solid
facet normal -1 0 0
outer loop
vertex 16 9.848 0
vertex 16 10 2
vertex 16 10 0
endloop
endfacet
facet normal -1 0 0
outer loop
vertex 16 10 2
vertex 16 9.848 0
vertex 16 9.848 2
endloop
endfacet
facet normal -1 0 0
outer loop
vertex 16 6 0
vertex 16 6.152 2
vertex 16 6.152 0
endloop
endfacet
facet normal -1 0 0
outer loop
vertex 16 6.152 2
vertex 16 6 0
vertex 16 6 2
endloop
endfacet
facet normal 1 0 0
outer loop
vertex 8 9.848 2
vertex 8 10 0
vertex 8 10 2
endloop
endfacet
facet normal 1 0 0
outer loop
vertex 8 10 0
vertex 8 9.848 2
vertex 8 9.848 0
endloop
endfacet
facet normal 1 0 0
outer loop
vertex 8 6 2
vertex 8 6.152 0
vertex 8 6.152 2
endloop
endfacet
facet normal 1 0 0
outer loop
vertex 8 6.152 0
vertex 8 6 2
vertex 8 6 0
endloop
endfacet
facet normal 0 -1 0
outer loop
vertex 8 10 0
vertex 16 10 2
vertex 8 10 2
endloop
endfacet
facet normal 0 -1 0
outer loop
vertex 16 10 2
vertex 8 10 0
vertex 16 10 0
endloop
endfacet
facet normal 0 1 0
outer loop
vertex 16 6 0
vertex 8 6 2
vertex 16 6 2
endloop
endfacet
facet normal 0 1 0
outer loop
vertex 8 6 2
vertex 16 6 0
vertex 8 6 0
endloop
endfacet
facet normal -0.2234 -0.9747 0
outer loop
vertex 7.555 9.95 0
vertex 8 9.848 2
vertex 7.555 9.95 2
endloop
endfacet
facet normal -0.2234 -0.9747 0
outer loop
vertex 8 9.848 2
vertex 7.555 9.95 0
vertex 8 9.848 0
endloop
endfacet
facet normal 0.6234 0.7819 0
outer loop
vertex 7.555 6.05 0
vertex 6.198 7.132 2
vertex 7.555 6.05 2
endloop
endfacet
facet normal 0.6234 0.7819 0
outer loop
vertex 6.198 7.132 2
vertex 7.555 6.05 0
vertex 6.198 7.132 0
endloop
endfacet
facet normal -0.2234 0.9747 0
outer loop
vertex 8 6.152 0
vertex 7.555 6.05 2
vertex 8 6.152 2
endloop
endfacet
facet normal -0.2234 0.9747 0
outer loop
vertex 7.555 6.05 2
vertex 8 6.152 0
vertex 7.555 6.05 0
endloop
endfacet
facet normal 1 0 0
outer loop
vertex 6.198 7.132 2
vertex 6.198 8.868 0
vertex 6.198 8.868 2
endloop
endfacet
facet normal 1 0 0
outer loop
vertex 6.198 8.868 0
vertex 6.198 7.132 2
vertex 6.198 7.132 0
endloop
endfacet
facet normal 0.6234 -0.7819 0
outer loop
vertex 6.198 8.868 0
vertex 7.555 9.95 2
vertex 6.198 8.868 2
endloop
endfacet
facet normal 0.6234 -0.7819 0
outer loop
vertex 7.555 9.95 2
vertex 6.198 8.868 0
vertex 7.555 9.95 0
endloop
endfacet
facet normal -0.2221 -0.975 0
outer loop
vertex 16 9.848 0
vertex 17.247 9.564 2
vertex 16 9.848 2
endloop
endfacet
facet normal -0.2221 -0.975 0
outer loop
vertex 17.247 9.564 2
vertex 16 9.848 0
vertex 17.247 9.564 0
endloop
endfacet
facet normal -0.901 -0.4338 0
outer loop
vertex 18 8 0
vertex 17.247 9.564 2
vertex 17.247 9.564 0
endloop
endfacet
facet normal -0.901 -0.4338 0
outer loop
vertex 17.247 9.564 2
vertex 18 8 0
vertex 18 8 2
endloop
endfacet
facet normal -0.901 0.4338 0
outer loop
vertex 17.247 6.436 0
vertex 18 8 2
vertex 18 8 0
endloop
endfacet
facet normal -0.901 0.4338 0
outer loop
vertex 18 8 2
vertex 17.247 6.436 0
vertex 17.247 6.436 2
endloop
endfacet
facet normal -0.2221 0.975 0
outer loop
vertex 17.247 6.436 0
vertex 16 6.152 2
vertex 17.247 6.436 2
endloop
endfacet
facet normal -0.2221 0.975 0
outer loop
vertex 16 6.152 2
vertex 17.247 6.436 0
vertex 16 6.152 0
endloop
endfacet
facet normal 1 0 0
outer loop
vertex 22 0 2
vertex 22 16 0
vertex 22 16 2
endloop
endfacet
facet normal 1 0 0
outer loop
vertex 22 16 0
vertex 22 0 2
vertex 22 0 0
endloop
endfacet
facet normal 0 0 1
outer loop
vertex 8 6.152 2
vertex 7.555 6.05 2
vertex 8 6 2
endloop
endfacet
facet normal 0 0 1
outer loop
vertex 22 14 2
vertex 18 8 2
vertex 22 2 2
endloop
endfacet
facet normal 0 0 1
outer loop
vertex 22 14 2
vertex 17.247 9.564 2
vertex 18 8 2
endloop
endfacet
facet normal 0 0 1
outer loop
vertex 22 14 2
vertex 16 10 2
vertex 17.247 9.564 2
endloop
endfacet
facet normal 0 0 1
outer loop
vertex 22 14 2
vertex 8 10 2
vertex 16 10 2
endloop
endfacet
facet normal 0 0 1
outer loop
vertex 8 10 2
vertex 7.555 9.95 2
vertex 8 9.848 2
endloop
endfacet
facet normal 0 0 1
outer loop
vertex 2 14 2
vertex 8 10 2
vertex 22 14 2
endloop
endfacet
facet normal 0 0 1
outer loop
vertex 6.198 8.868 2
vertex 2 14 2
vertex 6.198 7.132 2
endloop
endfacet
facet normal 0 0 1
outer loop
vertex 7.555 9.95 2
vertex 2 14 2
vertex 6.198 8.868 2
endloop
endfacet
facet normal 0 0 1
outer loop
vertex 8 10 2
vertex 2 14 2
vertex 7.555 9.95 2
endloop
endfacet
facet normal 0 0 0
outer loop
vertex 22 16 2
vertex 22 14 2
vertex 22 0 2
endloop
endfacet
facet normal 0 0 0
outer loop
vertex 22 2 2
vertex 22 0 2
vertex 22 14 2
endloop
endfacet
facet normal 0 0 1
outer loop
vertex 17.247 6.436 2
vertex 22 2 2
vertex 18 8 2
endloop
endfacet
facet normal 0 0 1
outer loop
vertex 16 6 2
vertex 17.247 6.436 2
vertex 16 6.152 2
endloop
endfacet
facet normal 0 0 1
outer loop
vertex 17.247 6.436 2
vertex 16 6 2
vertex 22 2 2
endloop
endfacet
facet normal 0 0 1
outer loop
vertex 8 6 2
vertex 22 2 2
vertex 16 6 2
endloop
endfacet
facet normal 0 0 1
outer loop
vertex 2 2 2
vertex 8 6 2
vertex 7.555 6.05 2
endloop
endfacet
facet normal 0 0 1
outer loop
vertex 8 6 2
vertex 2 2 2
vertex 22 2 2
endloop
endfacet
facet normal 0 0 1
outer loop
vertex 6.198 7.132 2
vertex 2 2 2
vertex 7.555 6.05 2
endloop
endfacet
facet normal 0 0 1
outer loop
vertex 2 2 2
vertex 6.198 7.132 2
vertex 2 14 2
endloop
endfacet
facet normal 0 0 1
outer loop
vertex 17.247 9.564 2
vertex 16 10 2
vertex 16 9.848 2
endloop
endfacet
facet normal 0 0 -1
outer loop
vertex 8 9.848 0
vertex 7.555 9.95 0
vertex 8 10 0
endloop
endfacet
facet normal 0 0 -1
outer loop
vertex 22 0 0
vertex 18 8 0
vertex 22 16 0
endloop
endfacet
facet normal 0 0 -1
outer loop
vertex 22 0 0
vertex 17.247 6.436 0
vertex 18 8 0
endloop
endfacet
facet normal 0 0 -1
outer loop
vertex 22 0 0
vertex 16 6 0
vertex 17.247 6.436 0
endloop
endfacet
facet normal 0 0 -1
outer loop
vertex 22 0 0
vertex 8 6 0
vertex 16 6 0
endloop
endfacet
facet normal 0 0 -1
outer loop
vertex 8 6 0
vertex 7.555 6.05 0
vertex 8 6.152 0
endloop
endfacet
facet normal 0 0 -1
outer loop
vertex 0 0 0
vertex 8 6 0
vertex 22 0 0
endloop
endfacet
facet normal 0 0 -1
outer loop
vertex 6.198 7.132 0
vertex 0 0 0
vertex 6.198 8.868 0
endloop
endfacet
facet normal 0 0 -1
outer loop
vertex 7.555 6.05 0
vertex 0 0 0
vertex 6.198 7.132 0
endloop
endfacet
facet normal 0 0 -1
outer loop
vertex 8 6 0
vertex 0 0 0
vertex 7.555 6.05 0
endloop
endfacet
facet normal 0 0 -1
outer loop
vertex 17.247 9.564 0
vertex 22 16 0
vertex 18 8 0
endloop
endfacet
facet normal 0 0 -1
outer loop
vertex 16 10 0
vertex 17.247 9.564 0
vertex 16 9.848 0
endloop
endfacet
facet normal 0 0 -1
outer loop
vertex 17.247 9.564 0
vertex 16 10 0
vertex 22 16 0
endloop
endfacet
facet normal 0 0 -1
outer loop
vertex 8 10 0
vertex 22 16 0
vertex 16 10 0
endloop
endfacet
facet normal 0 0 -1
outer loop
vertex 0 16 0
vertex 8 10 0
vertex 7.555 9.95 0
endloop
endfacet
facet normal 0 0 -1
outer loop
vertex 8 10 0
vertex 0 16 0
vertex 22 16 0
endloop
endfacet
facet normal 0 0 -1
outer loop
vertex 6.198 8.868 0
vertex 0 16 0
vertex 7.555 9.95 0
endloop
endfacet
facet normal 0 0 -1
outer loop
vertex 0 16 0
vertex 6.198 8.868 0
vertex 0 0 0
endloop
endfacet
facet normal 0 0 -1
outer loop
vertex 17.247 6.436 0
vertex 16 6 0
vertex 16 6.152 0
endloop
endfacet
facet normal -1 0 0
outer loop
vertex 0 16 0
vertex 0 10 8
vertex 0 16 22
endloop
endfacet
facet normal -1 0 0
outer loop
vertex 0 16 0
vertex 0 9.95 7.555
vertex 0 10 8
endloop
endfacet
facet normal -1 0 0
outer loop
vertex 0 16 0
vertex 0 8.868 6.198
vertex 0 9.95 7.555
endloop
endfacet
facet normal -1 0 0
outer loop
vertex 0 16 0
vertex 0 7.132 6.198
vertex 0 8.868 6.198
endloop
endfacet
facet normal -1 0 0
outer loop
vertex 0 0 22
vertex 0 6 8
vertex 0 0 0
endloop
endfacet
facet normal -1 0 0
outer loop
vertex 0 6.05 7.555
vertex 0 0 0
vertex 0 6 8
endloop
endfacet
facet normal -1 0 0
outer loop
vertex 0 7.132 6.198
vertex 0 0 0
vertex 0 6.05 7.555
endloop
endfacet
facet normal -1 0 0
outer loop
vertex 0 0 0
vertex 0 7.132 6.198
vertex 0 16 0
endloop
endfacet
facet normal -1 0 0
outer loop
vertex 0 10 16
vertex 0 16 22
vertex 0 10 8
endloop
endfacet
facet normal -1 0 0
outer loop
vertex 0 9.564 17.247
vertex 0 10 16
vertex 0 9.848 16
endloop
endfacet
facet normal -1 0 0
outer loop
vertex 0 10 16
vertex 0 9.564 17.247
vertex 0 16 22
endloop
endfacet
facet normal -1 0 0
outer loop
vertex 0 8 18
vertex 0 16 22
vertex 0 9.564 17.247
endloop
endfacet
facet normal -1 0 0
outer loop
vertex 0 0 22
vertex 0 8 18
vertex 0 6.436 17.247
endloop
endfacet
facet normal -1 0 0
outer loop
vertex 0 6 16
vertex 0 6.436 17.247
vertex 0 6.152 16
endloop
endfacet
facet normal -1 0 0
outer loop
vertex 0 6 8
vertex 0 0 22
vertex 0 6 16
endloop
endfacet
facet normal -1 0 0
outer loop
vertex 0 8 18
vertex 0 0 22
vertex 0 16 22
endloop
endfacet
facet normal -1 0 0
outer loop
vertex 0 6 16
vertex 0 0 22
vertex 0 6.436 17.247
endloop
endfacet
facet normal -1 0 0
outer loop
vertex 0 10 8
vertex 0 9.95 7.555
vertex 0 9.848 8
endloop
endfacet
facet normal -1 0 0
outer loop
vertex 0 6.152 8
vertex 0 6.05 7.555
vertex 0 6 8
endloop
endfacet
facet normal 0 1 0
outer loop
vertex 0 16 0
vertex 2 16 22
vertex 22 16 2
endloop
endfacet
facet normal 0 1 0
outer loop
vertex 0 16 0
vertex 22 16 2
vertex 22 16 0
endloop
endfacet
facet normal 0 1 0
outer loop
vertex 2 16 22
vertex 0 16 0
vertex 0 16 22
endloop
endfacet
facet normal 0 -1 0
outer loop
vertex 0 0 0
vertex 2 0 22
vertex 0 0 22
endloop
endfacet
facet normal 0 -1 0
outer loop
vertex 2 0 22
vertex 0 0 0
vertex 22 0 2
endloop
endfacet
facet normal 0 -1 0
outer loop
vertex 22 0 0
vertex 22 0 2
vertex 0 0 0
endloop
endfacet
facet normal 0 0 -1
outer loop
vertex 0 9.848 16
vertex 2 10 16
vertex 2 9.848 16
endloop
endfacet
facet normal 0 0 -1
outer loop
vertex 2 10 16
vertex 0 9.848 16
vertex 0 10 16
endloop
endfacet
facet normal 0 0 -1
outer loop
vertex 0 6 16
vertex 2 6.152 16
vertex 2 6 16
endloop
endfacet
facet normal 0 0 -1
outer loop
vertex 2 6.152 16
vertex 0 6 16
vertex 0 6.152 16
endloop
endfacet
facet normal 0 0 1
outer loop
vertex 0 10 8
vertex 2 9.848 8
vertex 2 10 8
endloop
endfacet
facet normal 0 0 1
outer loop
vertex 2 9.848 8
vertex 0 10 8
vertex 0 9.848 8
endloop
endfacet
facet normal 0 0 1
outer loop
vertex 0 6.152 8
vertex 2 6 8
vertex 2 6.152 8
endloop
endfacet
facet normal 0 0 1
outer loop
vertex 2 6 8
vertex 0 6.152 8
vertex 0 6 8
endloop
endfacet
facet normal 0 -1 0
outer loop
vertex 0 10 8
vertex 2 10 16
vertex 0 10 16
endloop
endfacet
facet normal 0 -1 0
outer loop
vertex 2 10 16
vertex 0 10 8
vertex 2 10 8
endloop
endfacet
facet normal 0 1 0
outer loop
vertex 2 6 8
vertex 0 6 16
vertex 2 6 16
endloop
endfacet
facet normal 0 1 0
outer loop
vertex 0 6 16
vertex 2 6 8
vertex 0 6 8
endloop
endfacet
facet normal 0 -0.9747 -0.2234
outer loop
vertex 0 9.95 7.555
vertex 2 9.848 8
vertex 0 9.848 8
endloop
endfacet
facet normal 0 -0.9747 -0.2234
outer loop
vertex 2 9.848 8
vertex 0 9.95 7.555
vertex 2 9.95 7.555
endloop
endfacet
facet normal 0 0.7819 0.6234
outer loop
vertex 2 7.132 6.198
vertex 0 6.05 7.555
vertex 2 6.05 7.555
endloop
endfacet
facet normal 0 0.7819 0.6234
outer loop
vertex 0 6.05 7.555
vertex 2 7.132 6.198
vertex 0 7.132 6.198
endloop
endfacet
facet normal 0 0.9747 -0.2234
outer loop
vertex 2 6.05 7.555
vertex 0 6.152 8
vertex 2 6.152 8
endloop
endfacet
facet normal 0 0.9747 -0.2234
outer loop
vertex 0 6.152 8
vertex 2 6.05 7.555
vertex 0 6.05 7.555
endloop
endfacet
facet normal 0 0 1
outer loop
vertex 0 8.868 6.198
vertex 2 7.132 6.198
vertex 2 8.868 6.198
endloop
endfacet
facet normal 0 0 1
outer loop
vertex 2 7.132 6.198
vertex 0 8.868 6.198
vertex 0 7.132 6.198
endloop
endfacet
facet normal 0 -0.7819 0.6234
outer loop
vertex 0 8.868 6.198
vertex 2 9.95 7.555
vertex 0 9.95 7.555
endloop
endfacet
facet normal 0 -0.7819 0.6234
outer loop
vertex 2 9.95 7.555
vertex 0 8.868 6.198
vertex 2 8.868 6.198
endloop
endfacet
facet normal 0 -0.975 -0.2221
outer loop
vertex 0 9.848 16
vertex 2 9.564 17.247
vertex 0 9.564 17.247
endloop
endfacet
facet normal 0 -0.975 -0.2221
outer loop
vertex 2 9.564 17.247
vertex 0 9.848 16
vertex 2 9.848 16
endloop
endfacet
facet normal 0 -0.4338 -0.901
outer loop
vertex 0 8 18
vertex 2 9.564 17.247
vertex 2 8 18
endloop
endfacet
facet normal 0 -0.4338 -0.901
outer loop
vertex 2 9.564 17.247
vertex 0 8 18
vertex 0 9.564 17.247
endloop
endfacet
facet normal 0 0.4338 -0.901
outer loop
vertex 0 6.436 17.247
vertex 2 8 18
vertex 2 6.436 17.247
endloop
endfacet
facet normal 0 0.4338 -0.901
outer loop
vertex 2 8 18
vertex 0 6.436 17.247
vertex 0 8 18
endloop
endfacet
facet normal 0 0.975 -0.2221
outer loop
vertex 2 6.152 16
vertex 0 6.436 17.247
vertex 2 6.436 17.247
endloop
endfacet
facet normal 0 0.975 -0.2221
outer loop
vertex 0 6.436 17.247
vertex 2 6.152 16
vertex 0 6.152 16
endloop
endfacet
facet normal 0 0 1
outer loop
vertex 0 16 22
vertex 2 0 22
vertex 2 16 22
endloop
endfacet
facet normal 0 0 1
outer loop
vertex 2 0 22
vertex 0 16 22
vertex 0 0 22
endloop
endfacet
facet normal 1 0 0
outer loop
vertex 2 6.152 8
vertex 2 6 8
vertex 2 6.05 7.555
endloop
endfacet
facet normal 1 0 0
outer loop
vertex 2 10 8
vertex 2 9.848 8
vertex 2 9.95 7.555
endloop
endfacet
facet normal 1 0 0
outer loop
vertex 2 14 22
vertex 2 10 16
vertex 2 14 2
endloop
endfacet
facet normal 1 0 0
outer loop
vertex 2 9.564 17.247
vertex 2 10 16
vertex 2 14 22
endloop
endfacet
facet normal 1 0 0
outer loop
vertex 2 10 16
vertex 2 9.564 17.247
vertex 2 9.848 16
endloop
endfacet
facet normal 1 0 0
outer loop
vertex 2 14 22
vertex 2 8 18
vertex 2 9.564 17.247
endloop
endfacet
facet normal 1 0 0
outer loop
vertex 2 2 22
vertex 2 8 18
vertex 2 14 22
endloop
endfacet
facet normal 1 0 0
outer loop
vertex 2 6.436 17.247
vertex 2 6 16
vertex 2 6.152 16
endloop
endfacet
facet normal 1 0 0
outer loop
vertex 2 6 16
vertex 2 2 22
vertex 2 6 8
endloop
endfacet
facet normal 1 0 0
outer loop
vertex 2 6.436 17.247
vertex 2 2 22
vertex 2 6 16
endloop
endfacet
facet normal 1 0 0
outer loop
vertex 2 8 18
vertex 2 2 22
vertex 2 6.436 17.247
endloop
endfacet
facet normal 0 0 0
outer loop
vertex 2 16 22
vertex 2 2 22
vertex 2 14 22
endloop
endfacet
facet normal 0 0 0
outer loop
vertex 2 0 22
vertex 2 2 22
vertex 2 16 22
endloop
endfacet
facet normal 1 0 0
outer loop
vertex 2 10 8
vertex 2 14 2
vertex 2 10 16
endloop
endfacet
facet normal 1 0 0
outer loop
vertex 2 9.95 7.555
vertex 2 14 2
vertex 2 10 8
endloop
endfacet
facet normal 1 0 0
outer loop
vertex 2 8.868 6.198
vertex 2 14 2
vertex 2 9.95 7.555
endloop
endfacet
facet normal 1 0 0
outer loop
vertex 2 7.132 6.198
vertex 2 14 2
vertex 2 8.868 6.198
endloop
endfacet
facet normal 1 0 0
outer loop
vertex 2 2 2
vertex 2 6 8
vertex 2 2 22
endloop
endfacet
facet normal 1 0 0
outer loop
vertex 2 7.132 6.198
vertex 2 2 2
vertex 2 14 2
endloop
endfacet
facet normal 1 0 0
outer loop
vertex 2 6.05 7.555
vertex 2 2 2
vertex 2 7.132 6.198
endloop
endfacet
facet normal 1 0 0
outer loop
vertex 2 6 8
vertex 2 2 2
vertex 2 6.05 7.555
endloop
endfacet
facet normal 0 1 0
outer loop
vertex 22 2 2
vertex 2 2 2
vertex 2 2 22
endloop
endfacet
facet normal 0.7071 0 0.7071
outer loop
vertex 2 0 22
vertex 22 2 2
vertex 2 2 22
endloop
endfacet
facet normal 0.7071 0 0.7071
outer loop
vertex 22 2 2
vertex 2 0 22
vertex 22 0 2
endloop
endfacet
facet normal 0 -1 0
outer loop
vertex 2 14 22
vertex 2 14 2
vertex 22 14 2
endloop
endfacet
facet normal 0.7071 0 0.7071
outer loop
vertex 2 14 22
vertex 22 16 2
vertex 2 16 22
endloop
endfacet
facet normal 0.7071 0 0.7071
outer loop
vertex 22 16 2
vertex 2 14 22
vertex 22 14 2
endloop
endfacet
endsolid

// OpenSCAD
// l-bracket.scad
//
// generates an l-bracket from the given parameters


// Copyright (c) 2015, Patrick Barrett
// All rights reserved.
//
// Redistribution and use in source and binary forms, with or without
// modification, are permitted provided that the following conditions are met:
//
// 1. Redistributions of source code must retain the above copyright notice,
// this list of conditions and the following disclaimer.
//
// 2. Redistributions in binary form must reproduce the above copyright notice,
// this list of conditions and the following disclaimer in the documentation
// and/or other materials provided with the distribution.
//
// THIS SOFTWARE IS PROVIDED BY THE COPYRIGHT HOLDERS AND CONTRIBUTORS "AS IS"
// AND ANY EXPRESS OR IMPLIED WARRANTIES, INCLUDING, BUT NOT LIMITED TO, THE
// IMPLIED WARRANTIES OF MERCHANTABILITY AND FITNESS FOR A PARTICULAR PURPOSE
// ARE DISCLAIMED. IN NO EVENT SHALL THE COPYRIGHT HOLDER OR CONTRIBUTORS BE
// LIABLE FOR ANY DIRECT, INDIRECT, INCIDENTAL, SPECIAL, EXEMPLARY, OR
// CONSEQUENTIAL DAMAGES (INCLUDING, BUT NOT LIMITED TO, PROCUREMENT OF
// SUBSTITUTE GOODS OR SERVICES; LOSS OF USE, DATA, OR PROFITS; OR BUSINESS
// INTERRUPTION) HOWEVER CAUSED AND ON ANY THEORY OF LIABILITY, WHETHER IN
// CONTRACT, STRICT LIABILITY, OR TORT (INCLUDING NEGLIGENCE OR OTHERWISE)
// ARISING IN ANY WAY OUT OF THE USE OF THIS SOFTWARE, EVEN IF ADVISED OF THE
// POSSIBILITY OF SUCH DAMAGE.

wall_thickness = 2;
internal_width = 12;
slot_width = 4;
side_length = 20;

// customizable variables end here

head_annulus = (internal_width/2) - (slot_width/2);

abit = 0.0001 * 1; //use for making overlap to get single manifold stl

module stadium3d(a, r, z, center = false){
	offset_x = center ? -(r + (a / 2)) : 0;
	offset_y = center ? -(r) : 0;
	offset_z = center ? -(z / 2) : 0;

	translate([offset_x, offset_y, offset_z])
	union() {
		translate([r, 0, 0])
			cube([a, 2*r, z]);
		translate([r, r, 0])
			cylinder(h = z, r = r, center = false);
		translate([r + a, r, 0])
			cylinder(h = z, r = r);
	}
}

union() {
	// horizontal wall
	difference() {
		cube([side_length + wall_thickness,
		      internal_width + 2*wall_thickness,
		      wall_thickness]);
		translate([wall_thickness + head_annulus,
		           wall_thickness + head_annulus,
		           -1])
			stadium3d(side_length - (2*head_annulus) - slot_width,
 			          slot_width / 2,
 			          wall_thickness + 2);
	}

	// verticle wall
	translate([wall_thickness, 0, 0])
	rotate([0,-90,0])
	difference() {
		cube([side_length + wall_thickness,
		      internal_width + 2*wall_thickness,
		      wall_thickness]);
		translate([wall_thickness + head_annulus,
		           wall_thickness + head_annulus,
		           -1])
			stadium3d(side_length - (2*head_annulus) - slot_width,
 			          slot_width / 2,
 			          wall_thickness + 2);
	}

	// bracer 1
	translate([wall_thickness - abit,
	           wall_thickness,
	           wall_thickness - abit])
	rotate([90,0,0])
	linear_extrude(height = wall_thickness) {
		polygon([[0,0],
		        [side_length,0],
		        [0,side_length]]);
	}

	// bracer 2
	translate([wall_thickness - abit,
	           2*wall_thickness + internal_width,
	           wall_thickness - abit])
	rotate([90,0,0])
	linear_extrude(height = wall_thickness) {
		polygon([[0,0],
		        [side_length,0],
		        [0,side_length]]);
	}
}
